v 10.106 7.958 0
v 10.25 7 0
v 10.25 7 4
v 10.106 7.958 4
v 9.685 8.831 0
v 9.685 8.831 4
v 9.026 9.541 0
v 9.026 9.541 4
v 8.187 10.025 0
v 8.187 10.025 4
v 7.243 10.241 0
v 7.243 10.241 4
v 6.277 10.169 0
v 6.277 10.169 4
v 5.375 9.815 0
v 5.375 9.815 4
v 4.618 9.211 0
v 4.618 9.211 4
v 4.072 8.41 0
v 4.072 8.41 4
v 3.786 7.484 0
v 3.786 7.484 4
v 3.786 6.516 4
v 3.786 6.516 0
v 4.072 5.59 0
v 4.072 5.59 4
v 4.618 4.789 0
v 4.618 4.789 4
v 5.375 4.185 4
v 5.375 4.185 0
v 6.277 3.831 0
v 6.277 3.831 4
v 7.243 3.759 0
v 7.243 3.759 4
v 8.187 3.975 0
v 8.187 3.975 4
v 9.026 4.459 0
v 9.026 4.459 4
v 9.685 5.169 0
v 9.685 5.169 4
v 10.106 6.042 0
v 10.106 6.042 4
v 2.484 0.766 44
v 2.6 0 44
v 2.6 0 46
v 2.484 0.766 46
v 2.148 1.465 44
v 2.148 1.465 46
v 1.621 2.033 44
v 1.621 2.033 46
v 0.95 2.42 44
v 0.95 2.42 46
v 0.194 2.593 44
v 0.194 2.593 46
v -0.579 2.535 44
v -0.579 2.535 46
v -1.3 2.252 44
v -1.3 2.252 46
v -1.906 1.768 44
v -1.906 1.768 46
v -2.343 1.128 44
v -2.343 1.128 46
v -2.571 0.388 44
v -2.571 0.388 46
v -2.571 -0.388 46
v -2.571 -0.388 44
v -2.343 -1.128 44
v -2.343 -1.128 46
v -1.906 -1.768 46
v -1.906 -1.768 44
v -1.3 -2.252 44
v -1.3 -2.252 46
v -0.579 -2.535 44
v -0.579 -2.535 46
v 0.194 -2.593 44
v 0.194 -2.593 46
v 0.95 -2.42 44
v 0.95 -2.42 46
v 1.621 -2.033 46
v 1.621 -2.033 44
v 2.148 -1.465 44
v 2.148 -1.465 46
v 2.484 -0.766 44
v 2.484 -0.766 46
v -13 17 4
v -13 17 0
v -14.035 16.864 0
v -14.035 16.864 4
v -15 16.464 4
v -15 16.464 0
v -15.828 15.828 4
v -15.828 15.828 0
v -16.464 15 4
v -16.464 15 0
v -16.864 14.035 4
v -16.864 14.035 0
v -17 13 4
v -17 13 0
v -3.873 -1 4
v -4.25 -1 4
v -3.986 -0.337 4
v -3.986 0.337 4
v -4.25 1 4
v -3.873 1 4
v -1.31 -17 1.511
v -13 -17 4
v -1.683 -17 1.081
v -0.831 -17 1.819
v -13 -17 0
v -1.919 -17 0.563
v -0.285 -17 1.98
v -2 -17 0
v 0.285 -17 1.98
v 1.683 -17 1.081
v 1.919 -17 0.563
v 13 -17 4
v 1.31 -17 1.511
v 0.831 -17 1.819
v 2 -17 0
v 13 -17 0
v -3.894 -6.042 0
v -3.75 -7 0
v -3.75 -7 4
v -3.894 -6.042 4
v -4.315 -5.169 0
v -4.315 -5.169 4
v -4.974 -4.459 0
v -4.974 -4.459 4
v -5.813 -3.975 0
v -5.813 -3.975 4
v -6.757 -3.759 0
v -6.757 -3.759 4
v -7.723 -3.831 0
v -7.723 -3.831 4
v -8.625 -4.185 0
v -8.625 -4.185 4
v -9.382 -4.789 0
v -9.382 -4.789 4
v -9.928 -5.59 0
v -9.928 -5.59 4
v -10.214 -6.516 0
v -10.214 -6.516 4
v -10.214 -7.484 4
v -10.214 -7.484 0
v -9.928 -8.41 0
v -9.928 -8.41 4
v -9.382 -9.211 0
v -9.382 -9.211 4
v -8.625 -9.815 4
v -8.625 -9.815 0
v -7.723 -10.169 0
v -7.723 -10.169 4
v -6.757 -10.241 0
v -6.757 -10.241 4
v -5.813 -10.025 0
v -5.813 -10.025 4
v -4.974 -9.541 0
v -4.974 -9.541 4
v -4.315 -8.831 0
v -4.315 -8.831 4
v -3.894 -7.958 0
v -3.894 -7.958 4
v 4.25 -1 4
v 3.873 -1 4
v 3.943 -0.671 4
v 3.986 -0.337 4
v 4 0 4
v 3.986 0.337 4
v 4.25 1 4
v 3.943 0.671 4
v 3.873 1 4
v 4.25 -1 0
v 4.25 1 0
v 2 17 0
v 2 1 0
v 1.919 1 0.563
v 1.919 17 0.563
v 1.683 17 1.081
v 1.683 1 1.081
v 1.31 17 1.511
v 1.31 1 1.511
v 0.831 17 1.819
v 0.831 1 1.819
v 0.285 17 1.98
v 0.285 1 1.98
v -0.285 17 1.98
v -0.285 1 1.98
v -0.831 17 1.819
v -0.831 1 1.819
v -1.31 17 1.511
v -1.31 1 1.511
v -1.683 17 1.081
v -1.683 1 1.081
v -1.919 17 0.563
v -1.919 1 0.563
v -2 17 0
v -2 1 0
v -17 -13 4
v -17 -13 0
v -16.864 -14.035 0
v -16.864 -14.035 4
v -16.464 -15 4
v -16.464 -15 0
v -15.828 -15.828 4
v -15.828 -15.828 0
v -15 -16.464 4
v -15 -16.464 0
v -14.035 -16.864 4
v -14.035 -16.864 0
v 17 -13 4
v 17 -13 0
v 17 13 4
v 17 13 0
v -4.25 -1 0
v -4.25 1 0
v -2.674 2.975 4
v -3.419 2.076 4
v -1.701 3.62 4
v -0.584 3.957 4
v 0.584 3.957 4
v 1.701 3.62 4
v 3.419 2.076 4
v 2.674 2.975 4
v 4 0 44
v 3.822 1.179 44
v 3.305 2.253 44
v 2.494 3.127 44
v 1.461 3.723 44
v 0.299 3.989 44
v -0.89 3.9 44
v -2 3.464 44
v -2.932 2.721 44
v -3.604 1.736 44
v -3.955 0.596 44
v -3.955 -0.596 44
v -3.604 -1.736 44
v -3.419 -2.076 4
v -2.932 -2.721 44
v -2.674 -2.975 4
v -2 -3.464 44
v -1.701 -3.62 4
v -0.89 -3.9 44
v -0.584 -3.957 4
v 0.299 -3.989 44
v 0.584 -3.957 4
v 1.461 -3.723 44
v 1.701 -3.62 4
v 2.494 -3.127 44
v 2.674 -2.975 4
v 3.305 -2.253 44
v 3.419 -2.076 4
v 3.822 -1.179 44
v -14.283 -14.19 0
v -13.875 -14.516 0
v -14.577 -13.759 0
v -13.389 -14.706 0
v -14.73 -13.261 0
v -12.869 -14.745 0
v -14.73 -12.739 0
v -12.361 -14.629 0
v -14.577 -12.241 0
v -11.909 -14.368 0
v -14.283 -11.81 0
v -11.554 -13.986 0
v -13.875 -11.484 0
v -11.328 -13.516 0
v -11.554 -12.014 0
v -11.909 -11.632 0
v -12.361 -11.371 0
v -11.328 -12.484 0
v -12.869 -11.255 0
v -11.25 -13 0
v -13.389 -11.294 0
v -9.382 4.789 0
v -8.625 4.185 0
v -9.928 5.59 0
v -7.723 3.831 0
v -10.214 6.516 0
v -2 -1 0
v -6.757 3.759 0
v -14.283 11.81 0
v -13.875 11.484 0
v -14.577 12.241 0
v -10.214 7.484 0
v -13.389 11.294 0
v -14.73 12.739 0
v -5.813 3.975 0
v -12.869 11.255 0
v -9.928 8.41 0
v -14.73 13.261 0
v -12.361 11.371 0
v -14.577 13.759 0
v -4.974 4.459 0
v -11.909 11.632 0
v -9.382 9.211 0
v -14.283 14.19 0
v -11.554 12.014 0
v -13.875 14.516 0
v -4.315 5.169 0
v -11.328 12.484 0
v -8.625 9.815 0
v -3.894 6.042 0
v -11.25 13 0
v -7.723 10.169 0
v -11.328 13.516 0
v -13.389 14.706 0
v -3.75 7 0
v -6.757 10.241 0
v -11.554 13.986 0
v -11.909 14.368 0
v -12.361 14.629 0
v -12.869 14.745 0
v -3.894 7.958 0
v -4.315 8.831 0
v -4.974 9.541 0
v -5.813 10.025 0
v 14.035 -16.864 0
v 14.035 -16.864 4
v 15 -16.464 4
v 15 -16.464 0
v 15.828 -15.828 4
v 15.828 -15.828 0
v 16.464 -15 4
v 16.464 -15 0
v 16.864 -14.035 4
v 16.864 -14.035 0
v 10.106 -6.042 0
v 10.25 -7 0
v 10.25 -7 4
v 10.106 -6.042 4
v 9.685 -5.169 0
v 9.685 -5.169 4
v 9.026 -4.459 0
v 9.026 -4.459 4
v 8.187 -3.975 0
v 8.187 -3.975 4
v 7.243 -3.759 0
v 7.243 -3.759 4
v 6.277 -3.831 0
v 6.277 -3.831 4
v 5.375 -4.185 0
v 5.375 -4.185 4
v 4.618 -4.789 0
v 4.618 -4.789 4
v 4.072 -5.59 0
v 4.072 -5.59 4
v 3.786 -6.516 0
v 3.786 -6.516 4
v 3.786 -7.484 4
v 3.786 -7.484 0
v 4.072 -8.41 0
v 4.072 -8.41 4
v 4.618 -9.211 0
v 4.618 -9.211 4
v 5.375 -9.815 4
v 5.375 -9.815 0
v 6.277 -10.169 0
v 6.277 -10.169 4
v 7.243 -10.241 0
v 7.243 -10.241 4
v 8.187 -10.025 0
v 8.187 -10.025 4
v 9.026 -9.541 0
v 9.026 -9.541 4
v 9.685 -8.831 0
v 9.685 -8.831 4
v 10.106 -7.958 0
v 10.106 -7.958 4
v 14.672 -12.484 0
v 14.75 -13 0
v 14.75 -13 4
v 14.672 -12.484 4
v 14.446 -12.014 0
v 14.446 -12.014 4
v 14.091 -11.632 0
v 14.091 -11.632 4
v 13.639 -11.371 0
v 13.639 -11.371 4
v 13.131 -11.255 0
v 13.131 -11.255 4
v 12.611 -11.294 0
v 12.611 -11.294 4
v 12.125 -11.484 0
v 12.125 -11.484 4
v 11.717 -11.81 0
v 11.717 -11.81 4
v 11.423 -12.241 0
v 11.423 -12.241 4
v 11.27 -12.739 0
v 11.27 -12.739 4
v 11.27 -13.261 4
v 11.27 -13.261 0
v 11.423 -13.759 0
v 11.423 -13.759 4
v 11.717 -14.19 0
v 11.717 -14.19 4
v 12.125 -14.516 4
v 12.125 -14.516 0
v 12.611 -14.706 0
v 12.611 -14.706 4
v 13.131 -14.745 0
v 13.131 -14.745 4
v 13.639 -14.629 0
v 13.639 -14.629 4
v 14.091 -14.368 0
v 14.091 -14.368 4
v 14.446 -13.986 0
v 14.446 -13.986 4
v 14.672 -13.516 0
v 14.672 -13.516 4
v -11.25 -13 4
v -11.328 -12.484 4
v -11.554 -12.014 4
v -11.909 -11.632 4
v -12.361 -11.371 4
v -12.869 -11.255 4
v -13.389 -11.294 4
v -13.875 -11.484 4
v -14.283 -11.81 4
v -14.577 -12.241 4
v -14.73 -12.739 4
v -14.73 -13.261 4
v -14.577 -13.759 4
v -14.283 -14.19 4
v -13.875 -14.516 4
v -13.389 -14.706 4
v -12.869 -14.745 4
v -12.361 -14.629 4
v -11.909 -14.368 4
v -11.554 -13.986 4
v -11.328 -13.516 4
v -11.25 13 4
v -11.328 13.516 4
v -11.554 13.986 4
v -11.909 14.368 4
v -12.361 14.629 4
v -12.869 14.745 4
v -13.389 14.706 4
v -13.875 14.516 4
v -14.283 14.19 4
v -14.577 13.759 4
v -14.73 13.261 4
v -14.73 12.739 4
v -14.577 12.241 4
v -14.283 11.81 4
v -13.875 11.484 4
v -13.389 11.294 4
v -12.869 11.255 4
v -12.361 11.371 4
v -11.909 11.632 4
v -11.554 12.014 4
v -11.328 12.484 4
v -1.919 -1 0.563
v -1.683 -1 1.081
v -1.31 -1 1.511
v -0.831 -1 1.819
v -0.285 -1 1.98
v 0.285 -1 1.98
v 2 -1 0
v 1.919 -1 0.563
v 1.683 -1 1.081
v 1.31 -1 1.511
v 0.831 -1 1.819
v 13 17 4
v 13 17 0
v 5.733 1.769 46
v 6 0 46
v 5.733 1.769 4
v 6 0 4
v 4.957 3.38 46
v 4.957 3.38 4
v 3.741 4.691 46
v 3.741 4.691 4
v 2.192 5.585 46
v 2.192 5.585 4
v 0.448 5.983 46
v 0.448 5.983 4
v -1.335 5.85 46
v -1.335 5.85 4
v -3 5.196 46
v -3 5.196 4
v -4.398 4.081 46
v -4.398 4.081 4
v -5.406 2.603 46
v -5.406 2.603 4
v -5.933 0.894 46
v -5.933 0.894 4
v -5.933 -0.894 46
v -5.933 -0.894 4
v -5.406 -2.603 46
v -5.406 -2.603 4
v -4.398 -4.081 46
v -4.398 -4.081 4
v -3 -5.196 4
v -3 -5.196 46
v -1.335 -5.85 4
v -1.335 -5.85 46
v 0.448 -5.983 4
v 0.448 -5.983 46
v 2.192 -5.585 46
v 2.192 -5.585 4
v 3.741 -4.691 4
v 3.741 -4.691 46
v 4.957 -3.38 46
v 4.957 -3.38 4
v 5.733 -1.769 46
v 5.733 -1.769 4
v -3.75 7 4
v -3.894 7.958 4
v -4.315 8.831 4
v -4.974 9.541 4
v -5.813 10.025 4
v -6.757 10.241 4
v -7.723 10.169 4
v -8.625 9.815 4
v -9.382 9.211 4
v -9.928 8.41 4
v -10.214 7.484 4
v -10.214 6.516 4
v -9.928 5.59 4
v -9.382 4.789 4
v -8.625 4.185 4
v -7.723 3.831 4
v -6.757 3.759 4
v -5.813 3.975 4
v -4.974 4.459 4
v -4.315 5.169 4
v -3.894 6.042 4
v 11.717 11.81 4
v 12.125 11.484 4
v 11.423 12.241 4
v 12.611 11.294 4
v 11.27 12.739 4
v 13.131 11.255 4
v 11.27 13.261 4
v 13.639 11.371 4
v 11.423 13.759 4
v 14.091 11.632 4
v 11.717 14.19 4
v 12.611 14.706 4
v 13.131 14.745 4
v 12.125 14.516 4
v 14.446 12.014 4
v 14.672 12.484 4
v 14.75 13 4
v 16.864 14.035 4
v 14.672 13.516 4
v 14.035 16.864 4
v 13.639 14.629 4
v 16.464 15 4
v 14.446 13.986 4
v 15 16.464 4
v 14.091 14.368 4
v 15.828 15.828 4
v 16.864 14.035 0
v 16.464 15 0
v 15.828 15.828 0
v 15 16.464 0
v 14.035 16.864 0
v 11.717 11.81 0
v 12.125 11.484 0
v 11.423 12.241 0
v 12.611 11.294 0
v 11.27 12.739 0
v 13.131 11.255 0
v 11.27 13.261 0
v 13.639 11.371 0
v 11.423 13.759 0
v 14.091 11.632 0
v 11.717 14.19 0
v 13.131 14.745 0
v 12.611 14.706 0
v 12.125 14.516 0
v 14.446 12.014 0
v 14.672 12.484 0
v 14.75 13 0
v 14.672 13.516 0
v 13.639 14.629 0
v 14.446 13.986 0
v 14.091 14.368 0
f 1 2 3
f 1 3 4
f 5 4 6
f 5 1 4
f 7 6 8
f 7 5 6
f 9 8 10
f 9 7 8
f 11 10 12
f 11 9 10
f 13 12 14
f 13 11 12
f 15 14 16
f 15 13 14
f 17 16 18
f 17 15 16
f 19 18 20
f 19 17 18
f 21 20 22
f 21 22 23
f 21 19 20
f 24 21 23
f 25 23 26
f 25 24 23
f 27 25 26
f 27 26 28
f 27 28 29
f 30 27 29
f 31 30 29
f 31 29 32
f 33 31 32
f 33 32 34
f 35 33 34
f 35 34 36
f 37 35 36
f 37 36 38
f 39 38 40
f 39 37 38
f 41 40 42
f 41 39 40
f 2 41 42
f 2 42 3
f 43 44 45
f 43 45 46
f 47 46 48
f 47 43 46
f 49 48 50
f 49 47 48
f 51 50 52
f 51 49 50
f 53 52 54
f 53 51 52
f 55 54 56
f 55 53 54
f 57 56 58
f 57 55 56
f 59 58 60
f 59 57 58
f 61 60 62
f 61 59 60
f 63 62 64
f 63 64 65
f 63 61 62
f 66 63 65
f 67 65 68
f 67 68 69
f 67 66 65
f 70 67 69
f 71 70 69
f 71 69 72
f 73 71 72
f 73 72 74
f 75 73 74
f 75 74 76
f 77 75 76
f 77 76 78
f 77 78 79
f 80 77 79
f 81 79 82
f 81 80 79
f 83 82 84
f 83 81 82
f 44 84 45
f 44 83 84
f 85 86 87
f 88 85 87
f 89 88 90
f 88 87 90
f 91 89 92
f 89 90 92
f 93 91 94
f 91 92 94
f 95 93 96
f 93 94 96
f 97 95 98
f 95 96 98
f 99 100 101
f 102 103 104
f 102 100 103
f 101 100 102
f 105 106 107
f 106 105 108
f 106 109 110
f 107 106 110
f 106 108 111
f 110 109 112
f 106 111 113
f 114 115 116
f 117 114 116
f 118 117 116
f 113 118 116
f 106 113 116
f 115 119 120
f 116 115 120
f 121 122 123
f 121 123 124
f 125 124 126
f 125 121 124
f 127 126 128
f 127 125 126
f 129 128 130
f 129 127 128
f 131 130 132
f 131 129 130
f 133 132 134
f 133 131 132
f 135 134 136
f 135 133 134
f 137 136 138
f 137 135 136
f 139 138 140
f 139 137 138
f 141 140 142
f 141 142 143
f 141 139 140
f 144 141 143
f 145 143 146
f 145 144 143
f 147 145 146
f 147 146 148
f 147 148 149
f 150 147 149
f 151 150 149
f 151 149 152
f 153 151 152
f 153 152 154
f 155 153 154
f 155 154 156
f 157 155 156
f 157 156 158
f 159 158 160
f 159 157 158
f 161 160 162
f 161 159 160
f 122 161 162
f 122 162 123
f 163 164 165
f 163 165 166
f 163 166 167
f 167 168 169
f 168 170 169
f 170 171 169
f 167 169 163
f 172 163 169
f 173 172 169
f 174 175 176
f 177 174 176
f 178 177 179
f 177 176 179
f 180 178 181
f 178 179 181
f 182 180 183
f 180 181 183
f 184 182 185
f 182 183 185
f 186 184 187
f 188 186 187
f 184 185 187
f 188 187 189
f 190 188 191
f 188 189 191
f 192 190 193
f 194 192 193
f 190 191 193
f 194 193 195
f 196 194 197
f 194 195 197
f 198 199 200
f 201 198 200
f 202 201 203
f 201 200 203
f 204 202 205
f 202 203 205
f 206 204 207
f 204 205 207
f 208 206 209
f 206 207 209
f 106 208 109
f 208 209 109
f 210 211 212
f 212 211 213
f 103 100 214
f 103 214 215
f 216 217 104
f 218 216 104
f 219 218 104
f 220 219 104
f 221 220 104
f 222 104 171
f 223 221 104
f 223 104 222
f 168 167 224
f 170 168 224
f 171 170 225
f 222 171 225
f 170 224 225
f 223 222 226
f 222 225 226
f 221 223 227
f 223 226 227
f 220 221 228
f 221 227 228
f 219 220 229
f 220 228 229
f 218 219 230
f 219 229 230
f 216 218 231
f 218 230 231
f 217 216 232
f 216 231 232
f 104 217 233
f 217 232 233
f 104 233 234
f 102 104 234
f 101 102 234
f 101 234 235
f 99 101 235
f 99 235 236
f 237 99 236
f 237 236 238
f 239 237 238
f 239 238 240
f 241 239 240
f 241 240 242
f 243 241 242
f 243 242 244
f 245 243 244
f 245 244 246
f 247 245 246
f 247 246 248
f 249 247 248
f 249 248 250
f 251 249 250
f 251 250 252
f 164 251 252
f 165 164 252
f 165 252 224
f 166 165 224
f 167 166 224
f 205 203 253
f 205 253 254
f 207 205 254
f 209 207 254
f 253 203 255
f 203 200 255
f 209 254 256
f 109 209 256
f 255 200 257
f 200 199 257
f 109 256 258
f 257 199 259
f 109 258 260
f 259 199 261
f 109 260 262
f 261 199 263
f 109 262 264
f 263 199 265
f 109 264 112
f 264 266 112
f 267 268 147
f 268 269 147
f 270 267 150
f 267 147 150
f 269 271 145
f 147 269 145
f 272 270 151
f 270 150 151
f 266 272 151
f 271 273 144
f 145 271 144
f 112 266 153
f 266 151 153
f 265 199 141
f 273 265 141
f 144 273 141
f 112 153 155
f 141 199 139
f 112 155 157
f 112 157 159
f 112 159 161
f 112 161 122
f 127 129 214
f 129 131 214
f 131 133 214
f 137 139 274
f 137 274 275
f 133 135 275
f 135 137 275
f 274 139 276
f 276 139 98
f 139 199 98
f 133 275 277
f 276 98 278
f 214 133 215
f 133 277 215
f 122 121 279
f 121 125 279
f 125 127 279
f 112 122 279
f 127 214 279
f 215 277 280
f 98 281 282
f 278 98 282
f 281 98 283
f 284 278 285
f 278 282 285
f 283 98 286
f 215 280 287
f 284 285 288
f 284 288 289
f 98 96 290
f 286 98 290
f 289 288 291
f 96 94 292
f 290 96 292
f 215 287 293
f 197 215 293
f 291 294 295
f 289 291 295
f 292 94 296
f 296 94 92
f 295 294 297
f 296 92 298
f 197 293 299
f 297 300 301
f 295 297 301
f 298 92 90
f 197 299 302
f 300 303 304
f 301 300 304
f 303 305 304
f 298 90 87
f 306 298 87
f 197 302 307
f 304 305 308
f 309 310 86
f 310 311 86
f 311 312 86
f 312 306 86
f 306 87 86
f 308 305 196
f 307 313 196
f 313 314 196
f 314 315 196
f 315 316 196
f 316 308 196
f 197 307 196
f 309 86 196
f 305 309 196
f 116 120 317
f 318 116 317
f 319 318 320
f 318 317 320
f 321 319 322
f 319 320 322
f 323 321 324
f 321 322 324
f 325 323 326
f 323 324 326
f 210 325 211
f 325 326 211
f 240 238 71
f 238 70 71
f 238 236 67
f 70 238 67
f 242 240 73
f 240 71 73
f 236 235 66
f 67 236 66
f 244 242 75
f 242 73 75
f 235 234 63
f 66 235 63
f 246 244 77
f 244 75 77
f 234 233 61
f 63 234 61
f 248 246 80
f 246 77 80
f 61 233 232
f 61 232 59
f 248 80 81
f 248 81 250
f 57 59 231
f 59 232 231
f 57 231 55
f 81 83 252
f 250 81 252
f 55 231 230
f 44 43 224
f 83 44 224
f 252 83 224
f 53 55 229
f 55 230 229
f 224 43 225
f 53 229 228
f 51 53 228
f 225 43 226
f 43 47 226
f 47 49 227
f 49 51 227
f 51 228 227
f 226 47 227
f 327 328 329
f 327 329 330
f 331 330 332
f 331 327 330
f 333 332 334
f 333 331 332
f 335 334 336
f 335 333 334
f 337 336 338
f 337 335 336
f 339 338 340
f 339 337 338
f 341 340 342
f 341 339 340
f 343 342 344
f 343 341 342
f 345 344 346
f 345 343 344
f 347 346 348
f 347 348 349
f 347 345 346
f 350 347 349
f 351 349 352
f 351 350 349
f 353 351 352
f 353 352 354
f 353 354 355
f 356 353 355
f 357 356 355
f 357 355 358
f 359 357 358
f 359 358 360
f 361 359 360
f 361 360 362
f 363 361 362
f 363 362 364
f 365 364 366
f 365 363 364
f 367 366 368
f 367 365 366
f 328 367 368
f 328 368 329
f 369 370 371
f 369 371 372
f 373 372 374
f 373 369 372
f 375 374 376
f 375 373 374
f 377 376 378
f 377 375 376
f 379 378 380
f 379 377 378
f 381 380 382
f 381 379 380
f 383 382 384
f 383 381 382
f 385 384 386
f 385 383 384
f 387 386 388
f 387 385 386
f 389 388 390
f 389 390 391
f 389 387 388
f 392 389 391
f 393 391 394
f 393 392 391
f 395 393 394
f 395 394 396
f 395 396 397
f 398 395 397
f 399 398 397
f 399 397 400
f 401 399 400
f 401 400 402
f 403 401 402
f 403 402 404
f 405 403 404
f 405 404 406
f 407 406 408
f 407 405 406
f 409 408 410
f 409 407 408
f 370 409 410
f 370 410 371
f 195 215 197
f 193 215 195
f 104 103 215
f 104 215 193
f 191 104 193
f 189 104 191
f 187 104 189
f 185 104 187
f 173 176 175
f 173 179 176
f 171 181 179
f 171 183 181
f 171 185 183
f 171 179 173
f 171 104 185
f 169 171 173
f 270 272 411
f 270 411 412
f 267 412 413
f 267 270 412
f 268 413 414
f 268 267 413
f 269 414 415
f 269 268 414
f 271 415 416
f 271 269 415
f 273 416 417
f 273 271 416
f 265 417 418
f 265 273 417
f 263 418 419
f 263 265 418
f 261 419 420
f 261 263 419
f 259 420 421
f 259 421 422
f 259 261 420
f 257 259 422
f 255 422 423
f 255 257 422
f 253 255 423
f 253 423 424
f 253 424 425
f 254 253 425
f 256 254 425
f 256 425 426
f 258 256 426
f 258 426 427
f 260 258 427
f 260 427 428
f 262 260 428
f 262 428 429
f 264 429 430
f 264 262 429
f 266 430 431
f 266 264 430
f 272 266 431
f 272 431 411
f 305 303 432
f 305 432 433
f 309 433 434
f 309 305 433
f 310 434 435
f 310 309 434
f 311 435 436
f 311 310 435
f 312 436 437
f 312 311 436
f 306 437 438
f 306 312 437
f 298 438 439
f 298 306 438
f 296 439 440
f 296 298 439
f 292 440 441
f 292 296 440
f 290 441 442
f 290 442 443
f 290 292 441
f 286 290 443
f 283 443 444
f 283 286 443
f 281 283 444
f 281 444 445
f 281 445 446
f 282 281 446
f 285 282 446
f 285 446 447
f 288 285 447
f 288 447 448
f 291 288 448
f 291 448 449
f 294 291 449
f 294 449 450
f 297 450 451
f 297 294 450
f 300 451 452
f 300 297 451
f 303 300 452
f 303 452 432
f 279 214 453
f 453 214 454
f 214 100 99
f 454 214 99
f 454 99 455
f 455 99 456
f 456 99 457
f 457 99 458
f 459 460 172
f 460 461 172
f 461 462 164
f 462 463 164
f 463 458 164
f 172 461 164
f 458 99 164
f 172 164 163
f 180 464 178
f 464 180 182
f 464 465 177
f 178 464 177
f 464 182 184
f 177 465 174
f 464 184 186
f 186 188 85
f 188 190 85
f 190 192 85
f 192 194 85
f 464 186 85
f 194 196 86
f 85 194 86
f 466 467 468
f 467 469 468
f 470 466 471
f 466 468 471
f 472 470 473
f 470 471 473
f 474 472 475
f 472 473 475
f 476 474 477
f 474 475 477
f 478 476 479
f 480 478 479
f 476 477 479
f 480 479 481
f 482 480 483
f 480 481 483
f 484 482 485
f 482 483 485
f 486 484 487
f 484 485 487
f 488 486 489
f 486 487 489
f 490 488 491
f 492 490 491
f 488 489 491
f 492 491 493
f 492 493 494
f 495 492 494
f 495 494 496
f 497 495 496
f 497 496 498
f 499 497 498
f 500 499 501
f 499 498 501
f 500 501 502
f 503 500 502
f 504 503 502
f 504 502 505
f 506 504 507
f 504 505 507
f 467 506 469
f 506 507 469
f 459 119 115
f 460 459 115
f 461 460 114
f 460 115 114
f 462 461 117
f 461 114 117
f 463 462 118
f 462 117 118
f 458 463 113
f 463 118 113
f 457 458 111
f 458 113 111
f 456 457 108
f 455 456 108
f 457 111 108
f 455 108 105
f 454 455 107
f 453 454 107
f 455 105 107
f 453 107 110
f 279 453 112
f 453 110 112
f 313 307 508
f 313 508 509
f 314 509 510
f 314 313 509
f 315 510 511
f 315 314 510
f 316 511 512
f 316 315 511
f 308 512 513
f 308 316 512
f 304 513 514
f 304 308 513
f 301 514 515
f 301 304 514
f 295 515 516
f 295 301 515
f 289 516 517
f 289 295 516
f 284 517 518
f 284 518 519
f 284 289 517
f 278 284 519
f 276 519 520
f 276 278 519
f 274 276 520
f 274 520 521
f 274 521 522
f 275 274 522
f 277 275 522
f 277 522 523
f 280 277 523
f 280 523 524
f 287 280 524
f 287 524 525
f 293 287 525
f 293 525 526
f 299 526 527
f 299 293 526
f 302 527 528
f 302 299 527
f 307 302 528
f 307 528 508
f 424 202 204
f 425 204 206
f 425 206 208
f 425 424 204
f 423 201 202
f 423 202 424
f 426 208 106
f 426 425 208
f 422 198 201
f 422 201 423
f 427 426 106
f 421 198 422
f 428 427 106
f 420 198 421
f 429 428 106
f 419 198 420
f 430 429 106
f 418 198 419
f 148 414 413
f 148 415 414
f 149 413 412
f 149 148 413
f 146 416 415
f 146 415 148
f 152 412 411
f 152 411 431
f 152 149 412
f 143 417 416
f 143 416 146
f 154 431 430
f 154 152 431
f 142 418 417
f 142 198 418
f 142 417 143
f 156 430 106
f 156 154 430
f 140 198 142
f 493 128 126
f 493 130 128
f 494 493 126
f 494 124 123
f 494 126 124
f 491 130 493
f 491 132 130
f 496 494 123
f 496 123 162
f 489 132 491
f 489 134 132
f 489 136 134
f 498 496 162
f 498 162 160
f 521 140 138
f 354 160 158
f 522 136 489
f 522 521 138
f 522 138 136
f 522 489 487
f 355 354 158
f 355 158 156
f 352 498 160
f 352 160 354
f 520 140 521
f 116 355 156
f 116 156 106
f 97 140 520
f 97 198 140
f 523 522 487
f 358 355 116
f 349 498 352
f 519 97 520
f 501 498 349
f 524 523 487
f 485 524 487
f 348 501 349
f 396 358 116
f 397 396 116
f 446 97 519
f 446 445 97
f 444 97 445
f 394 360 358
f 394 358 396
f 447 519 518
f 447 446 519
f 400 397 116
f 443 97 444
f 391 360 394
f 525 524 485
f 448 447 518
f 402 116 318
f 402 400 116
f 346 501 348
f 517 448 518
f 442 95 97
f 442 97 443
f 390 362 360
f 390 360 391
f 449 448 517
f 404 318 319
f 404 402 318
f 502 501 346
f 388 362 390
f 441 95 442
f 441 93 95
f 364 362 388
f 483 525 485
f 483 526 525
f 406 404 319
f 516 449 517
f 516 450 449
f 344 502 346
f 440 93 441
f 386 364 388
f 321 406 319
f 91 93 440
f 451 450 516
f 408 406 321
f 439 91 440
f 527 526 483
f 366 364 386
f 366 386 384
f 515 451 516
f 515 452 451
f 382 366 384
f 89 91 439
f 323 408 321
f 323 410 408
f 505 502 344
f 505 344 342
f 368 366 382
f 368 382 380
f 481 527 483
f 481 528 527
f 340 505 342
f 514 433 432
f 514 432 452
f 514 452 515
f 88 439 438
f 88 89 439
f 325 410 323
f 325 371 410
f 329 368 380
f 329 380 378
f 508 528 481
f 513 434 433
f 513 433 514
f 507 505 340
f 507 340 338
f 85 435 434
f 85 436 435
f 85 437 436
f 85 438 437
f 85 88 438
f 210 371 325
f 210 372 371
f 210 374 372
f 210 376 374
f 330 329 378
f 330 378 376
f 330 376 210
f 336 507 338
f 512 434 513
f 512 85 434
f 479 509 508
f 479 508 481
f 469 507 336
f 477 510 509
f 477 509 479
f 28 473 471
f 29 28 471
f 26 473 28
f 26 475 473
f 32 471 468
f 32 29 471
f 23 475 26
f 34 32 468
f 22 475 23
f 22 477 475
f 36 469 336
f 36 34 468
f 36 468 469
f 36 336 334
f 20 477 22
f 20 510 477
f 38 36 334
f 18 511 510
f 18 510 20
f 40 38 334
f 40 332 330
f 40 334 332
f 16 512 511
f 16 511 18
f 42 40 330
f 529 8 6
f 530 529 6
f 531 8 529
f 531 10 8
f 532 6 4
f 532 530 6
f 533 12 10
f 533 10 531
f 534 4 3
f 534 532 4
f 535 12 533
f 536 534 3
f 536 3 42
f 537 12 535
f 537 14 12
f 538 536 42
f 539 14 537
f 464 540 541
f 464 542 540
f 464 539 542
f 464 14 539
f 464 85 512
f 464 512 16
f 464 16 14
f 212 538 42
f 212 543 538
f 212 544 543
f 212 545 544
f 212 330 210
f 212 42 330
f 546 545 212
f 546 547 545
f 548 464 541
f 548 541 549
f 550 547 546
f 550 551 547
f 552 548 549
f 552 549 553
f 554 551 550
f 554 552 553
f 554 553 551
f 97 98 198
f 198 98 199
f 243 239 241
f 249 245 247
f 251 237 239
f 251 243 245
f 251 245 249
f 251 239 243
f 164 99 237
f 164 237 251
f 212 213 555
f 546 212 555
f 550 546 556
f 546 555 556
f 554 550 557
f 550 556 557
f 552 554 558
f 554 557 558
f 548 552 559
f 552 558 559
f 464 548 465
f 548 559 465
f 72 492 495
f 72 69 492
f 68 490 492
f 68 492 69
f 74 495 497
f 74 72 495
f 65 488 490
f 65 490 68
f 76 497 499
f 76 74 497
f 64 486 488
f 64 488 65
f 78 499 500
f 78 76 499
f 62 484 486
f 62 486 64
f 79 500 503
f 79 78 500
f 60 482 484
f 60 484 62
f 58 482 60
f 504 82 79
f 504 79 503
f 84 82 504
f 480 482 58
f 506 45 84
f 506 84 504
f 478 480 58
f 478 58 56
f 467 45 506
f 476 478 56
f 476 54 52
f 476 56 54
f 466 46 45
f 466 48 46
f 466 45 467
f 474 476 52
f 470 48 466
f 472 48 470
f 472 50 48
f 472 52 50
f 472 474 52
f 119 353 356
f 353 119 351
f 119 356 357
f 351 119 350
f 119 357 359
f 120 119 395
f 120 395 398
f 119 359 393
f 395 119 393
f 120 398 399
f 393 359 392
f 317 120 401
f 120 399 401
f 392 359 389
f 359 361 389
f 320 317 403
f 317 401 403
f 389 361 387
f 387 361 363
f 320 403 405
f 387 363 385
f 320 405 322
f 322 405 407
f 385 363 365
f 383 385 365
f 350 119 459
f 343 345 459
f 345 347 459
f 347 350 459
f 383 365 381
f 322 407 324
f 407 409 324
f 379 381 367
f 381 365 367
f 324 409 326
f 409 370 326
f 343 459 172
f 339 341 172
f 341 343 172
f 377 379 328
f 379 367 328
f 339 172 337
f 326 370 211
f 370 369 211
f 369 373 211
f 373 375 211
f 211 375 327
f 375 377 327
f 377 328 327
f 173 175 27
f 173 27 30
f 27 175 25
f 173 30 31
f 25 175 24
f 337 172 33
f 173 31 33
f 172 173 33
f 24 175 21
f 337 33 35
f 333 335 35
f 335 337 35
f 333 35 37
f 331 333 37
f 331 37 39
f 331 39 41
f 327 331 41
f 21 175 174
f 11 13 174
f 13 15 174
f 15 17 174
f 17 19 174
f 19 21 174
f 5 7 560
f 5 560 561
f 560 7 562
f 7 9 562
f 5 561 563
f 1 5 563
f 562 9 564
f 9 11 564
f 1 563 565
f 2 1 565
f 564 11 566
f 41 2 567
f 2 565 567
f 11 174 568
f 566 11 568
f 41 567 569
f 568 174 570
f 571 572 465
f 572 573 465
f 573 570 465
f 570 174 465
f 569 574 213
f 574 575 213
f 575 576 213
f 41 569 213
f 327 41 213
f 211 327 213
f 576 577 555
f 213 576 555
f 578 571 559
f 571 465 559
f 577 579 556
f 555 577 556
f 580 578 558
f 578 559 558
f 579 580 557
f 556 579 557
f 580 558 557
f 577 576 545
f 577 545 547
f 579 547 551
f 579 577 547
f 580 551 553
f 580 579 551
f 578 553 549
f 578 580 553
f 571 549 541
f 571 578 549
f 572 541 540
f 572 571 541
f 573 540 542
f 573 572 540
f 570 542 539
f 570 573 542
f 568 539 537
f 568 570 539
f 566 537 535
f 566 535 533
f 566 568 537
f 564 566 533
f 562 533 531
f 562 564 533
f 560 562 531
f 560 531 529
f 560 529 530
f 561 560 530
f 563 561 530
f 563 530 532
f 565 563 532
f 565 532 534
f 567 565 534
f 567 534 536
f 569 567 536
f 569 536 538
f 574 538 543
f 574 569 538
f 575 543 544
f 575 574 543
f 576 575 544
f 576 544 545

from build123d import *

# Parameters (mm, degrees)
F0_R      = 1.75
F0_R_2    = 3.25
F1_DEPTH  = 4
F2_R      = 2
F3_DEPTH  = 34
F5_R      = 6
F6_DEPTH  = 40
F7_R      = 4
F8_DEPTH  = 40
F10_R     = 6
F10_R_2   = 2.6
F11_DEPTH = 2
F12_W     = 8.5
F12_H     = 2
F13_DEPTH = 10


with BuildPart() as f1:
    # F0 (on Top) → F1 (new body)
    with BuildSketch(Plane.XY):
        with BuildLine():
            ThreePointArc((-17, -13), (-15.828427, -15.828427), (-13, -17))
            Line((-13, -17), (13, -17))
            ThreePointArc((13, -17), (15.828427, -15.828427), (17, -13))
            Line((17, -13), (17, 13))
            ThreePointArc((17, 13), (15.828427, 15.828427), (13, 17))
            Line((13, 17), (-13, 17))
            ThreePointArc((-13, 17), (-15.828427, 15.828427), (-17, 13))
            Line((-17, 13), (-17, -13))
        make_face()
        with Locations((-13, -13)):
            Circle(F0_R, mode=Mode.SUBTRACT)
        with Locations((-7, -7)):
            Circle(F0_R_2, mode=Mode.SUBTRACT)
        with Locations((13, -13)):
            Circle(F0_R, mode=Mode.SUBTRACT)
        with Locations((7, -7)):
            Circle(F0_R_2, mode=Mode.SUBTRACT)
        with Locations((-7, 7)):
            Circle(F0_R_2, mode=Mode.SUBTRACT)
        with Locations((-13, 13)):
            Circle(F0_R, mode=Mode.SUBTRACT)
        with Locations((7, 7)):
            Circle(F0_R_2, mode=Mode.SUBTRACT)
        with Locations((13, 13)):
            Circle(F0_R, mode=Mode.SUBTRACT)
    extrude(amount=F1_DEPTH)


with BuildPart() as f3:
    # F2 (on face) → F3 (new body)
    with BuildSketch(Plane.XZ.offset(17)):
        Circle(F2_R)
    extrude(amount=-F3_DEPTH)


with BuildPart() as f1_1:
    add(f1.part)

    # F4: cut F3
    add(f3.part, mode=Mode.SUBTRACT)

    # F5 (on face) → F6 (join)
    with BuildSketch(Plane.XY.offset(4)):
        Circle(F5_R)
    extrude(amount=F6_DEPTH)


with BuildPart() as f8:
    # F7 (on face) → F8 (new body)
    with BuildSketch(Plane.XY.offset(44)):
        Circle(F7_R)
    extrude(amount=-F8_DEPTH)


with BuildPart() as f1_2:
    add(f1_1.part)

    # F9: cut F8
    add(f8.part, mode=Mode.SUBTRACT)

    # F10 (on face) → F11 (join)
    with BuildSketch(Plane.XY.offset(44)):
        Circle(F10_R)
        Circle(F10_R_2, mode=Mode.SUBTRACT)
    extrude(amount=F11_DEPTH)


with BuildPart() as f13:
    # F12 (on face) → F13 (new body)
    with BuildSketch(Plane.XY.offset(4)):
        Rectangle(F12_W, F12_H)
    extrude(amount=-F13_DEPTH)


with BuildPart() as f1_3:
    add(f1_2.part)

    # F14: cut F13
    add(f13.part, mode=Mode.SUBTRACT)


solid = f1_3.part
